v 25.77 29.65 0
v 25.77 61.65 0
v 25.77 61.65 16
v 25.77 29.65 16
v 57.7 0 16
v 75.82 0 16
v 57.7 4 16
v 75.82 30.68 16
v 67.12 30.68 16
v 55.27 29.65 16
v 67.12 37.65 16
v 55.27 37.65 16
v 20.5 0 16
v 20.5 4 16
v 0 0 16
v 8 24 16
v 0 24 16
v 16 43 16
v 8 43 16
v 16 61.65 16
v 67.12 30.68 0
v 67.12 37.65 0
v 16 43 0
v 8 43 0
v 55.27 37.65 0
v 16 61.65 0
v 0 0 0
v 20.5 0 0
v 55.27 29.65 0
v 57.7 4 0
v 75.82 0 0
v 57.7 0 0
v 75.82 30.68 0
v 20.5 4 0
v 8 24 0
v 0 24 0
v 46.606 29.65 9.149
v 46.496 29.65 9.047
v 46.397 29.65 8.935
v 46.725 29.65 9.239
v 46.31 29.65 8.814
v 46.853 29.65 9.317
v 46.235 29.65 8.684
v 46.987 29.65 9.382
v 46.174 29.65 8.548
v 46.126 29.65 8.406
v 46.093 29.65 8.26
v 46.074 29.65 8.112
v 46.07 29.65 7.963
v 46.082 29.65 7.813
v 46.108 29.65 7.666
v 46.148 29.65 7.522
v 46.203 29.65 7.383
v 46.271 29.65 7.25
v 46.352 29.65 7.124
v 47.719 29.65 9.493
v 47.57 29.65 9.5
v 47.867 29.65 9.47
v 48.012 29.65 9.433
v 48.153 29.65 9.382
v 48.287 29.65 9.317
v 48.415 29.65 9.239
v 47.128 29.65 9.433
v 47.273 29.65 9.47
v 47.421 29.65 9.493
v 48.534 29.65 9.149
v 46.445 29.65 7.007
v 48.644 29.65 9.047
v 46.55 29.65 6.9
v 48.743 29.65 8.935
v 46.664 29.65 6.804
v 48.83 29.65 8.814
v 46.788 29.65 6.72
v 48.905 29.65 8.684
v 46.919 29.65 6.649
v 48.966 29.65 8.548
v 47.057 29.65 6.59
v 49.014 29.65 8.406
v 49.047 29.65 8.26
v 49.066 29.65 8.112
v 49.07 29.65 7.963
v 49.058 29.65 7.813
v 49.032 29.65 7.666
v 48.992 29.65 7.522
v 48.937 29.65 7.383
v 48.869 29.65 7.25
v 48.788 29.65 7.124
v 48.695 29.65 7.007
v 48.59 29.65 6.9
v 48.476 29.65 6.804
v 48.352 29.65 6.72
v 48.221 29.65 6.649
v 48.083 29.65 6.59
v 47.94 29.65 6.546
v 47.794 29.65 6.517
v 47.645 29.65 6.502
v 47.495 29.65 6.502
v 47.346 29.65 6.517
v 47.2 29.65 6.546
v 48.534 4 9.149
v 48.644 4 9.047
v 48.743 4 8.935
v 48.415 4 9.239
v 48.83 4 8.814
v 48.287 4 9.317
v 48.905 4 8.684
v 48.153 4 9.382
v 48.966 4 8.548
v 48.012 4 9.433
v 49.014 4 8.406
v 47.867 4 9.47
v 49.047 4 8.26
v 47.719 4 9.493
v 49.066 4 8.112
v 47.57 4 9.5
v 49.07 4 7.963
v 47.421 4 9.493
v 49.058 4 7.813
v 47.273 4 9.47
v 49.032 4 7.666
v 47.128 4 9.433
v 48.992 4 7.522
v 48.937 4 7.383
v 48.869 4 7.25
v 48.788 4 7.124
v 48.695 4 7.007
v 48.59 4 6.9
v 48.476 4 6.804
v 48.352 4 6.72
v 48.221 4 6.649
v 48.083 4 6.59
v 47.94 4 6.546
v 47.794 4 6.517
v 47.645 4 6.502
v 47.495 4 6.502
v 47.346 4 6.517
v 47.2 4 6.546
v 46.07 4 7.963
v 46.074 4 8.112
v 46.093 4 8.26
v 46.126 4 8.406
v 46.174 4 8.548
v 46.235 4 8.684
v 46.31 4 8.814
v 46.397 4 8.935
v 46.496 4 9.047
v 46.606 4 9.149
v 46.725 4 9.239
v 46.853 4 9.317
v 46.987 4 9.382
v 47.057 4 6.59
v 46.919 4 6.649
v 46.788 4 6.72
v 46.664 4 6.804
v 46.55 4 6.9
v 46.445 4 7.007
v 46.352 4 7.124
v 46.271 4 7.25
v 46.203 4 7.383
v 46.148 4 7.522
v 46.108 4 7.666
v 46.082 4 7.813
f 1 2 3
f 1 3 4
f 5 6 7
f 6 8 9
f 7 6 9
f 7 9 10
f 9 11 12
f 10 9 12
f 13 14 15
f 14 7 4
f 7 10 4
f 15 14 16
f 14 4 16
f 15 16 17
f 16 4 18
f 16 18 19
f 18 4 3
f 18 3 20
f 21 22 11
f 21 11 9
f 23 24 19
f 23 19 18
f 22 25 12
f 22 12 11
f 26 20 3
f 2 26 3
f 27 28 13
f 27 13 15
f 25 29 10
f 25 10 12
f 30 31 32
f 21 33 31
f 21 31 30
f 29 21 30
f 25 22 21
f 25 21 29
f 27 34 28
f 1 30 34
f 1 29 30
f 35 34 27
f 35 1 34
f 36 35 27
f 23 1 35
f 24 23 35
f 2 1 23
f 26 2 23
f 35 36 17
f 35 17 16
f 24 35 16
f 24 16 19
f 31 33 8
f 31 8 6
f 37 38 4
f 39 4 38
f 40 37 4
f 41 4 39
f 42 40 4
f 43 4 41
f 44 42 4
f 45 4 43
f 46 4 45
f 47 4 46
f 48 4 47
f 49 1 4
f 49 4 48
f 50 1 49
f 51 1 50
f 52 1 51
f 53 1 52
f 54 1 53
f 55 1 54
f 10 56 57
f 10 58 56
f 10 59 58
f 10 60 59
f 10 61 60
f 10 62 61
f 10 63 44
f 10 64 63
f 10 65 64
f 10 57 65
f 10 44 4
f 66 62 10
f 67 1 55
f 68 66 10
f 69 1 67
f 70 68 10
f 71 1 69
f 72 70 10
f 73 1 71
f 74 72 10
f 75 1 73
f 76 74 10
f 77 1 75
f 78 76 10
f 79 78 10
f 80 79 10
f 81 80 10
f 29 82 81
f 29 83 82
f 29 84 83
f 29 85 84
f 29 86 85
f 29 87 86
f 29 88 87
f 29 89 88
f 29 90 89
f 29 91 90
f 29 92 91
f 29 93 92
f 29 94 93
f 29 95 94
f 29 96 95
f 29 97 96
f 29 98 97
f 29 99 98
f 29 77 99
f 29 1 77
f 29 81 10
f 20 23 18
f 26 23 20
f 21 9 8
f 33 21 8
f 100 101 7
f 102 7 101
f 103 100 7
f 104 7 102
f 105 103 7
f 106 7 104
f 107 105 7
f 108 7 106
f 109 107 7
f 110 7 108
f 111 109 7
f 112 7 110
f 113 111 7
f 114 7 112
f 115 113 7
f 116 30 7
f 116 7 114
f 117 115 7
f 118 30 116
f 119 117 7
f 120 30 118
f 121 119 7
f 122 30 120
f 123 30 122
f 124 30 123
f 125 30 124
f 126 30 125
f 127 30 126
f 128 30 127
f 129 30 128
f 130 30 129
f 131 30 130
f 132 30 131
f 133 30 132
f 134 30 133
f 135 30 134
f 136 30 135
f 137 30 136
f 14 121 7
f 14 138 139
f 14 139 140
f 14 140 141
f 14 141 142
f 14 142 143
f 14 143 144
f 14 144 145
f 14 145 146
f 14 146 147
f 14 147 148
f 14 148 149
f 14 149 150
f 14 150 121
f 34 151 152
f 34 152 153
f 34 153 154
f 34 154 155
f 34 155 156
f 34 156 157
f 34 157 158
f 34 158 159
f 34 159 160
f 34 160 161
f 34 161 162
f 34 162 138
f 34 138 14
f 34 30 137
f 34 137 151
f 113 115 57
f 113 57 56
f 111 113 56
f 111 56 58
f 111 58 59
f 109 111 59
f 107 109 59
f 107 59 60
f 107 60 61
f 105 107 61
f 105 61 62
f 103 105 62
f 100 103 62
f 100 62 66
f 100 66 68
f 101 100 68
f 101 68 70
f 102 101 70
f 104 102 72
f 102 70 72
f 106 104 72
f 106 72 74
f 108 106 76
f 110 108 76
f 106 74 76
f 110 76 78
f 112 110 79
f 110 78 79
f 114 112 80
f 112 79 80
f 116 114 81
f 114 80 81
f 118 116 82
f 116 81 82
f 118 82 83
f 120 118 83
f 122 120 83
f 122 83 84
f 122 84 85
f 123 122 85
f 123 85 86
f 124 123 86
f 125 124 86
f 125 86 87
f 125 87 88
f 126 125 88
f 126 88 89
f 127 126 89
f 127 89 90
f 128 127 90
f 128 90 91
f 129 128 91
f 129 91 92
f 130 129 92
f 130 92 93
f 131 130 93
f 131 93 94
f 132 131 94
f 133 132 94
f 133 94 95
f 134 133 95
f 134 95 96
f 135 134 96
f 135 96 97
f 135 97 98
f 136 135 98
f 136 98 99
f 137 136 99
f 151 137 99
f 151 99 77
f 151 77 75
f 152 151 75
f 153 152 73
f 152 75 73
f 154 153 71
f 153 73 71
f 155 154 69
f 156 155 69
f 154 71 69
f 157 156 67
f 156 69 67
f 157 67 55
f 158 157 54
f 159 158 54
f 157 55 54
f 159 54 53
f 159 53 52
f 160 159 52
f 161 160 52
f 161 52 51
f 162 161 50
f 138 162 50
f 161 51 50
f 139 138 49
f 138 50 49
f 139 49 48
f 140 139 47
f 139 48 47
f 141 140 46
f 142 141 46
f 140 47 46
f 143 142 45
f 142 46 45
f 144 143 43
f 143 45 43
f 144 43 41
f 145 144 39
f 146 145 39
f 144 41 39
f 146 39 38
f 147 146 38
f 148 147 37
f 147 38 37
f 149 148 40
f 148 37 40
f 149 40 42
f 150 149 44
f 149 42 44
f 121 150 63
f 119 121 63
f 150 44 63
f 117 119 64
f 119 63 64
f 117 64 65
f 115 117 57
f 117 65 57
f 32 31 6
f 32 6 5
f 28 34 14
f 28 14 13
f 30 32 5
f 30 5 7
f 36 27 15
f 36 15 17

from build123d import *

# Parameters (mm, degrees)
BOSS_EXTRUDE1_DEPTH = 16
SKETCH2_R           = 1.5
CUT_EXTRUDE1_DEPTH  = 84.837177911


with BuildPart() as part:
    # Sketch1 → Boss-Extrude1 (new body)
    with BuildSketch(Plane.XY):
        Polygon((0, 0), (0, 24), (8, 24), (8, 43), (16, 43), (16, 61.65), (25.77, 61.65), (25.77, 29.65), (55.27, 29.65), (55.27, 37.65), (67.12, 37.65), (67.12, 30.68), (75.82, 30.68), (75.82, 0), (57.7, 0), (57.7, 4), (20.5, 4), (20.5, 0), align=None)
    extrude(amount=BOSS_EXTRUDE1_DEPTH)

    # Sketch2 → Cut-Extrude1 (cut, through all)
    with BuildSketch(Plane(origin=(0, 29.65, 0), x_dir=(1, 0, 0), z_dir=(0, 1, 0))):
        with Locations(Location((47.57, -8, 0), (0, 0, 270))):
            Circle(SKETCH2_R)
    extrude(amount=-CUT_EXTRUDE1_DEPTH, mode=Mode.SUBTRACT)


solid = part.part
